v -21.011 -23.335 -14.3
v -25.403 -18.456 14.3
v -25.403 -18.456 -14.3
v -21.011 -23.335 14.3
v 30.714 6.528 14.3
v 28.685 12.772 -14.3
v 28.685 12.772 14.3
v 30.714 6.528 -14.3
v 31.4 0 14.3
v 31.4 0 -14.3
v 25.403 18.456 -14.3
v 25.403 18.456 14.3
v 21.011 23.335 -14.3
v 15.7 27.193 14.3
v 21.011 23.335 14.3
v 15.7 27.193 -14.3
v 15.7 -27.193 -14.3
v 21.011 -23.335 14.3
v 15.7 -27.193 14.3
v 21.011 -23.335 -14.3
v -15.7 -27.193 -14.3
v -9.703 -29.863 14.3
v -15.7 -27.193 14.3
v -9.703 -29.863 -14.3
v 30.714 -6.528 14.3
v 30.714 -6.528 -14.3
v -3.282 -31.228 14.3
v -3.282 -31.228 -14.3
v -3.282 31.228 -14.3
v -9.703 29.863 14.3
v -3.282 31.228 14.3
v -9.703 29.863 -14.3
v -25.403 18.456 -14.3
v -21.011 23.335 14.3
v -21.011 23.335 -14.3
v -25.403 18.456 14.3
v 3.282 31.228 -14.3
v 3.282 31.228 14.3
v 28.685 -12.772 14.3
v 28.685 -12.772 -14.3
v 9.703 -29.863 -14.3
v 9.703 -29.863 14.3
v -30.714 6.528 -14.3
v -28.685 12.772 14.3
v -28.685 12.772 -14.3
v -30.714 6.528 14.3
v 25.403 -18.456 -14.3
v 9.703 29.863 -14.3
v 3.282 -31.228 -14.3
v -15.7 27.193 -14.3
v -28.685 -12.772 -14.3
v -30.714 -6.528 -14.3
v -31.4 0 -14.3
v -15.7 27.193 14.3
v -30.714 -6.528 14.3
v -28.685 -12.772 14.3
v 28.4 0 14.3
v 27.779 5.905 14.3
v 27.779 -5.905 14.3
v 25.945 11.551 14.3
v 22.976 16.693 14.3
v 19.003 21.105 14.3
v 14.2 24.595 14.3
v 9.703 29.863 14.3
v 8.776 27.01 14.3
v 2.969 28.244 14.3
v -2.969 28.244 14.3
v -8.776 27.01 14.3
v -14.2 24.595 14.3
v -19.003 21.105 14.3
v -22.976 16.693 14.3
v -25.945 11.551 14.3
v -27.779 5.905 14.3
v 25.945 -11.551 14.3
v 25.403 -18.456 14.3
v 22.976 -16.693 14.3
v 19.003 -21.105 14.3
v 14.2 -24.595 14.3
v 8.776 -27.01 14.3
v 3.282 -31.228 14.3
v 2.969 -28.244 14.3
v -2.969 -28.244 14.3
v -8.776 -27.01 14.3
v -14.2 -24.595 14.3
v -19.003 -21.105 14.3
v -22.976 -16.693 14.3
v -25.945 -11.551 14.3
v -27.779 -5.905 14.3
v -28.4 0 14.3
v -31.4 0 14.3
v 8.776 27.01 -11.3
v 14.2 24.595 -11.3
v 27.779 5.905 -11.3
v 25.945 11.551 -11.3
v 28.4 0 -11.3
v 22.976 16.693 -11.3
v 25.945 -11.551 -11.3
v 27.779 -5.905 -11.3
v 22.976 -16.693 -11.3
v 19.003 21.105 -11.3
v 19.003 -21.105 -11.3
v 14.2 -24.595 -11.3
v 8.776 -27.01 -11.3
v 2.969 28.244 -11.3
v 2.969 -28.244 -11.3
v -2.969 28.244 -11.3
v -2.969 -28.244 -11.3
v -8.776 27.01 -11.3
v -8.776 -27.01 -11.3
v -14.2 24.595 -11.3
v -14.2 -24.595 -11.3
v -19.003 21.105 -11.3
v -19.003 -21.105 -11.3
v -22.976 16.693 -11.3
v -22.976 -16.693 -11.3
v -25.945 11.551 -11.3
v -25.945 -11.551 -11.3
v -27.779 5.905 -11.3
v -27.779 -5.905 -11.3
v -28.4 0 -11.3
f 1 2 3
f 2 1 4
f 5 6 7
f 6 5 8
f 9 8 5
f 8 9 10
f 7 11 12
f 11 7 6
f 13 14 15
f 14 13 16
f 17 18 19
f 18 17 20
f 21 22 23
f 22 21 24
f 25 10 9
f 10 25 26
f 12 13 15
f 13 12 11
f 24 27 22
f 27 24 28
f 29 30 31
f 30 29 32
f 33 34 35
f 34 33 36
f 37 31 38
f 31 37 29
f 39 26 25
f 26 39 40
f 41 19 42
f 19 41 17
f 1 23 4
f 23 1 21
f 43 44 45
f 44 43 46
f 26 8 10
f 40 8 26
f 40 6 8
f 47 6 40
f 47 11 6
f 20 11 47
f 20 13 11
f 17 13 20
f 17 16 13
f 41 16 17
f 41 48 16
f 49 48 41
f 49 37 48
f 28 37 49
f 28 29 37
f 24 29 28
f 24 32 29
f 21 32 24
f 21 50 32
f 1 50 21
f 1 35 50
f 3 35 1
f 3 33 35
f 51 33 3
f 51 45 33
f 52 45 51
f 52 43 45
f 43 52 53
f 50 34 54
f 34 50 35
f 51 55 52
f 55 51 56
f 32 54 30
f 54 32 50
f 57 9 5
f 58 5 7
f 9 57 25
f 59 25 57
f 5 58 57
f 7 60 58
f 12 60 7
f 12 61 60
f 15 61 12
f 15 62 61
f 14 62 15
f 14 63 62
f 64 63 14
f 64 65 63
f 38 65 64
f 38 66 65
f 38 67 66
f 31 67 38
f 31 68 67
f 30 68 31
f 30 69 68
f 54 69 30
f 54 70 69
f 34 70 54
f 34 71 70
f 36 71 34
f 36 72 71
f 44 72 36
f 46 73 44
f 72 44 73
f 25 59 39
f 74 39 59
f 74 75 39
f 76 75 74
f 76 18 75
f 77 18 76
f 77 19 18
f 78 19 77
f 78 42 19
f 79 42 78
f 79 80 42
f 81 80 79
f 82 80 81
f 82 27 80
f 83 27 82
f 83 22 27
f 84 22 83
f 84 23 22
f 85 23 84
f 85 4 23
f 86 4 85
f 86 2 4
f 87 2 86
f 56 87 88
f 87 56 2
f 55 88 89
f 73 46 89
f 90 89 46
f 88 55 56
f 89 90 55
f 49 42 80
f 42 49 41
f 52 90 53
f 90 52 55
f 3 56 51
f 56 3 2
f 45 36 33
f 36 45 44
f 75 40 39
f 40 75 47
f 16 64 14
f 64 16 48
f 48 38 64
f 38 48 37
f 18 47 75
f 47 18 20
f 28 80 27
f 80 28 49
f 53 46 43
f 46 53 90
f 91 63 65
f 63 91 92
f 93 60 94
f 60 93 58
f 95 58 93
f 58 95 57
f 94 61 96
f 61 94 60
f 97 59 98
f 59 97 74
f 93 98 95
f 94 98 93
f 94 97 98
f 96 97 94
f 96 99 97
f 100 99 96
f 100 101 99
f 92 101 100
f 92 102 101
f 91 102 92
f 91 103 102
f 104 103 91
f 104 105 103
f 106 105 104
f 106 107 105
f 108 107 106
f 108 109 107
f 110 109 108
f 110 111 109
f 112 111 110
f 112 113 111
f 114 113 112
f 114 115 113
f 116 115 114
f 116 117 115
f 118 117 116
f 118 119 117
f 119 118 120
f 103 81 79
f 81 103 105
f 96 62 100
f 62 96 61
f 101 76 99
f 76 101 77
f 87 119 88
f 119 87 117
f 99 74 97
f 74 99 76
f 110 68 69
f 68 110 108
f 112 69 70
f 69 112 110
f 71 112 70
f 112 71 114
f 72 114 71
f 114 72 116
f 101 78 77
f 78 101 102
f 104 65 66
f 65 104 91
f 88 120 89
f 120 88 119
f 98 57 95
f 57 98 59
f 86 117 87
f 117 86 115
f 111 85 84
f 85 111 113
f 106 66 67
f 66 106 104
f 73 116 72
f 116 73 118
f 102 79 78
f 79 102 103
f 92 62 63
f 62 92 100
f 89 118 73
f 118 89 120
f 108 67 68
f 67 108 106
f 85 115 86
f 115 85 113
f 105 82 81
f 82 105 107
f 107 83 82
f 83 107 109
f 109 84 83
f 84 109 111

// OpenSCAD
base_radius = 31.4;
base_height = 28.6;
wall_thickness = 3;
width = base_radius * 2;

difference() {
    cylinder(h=base_height, d=width, center=true);
    translate([0,0,wall_thickness]) cylinder(h=base_height, d=width-wall_thickness*2, center=true);
}
